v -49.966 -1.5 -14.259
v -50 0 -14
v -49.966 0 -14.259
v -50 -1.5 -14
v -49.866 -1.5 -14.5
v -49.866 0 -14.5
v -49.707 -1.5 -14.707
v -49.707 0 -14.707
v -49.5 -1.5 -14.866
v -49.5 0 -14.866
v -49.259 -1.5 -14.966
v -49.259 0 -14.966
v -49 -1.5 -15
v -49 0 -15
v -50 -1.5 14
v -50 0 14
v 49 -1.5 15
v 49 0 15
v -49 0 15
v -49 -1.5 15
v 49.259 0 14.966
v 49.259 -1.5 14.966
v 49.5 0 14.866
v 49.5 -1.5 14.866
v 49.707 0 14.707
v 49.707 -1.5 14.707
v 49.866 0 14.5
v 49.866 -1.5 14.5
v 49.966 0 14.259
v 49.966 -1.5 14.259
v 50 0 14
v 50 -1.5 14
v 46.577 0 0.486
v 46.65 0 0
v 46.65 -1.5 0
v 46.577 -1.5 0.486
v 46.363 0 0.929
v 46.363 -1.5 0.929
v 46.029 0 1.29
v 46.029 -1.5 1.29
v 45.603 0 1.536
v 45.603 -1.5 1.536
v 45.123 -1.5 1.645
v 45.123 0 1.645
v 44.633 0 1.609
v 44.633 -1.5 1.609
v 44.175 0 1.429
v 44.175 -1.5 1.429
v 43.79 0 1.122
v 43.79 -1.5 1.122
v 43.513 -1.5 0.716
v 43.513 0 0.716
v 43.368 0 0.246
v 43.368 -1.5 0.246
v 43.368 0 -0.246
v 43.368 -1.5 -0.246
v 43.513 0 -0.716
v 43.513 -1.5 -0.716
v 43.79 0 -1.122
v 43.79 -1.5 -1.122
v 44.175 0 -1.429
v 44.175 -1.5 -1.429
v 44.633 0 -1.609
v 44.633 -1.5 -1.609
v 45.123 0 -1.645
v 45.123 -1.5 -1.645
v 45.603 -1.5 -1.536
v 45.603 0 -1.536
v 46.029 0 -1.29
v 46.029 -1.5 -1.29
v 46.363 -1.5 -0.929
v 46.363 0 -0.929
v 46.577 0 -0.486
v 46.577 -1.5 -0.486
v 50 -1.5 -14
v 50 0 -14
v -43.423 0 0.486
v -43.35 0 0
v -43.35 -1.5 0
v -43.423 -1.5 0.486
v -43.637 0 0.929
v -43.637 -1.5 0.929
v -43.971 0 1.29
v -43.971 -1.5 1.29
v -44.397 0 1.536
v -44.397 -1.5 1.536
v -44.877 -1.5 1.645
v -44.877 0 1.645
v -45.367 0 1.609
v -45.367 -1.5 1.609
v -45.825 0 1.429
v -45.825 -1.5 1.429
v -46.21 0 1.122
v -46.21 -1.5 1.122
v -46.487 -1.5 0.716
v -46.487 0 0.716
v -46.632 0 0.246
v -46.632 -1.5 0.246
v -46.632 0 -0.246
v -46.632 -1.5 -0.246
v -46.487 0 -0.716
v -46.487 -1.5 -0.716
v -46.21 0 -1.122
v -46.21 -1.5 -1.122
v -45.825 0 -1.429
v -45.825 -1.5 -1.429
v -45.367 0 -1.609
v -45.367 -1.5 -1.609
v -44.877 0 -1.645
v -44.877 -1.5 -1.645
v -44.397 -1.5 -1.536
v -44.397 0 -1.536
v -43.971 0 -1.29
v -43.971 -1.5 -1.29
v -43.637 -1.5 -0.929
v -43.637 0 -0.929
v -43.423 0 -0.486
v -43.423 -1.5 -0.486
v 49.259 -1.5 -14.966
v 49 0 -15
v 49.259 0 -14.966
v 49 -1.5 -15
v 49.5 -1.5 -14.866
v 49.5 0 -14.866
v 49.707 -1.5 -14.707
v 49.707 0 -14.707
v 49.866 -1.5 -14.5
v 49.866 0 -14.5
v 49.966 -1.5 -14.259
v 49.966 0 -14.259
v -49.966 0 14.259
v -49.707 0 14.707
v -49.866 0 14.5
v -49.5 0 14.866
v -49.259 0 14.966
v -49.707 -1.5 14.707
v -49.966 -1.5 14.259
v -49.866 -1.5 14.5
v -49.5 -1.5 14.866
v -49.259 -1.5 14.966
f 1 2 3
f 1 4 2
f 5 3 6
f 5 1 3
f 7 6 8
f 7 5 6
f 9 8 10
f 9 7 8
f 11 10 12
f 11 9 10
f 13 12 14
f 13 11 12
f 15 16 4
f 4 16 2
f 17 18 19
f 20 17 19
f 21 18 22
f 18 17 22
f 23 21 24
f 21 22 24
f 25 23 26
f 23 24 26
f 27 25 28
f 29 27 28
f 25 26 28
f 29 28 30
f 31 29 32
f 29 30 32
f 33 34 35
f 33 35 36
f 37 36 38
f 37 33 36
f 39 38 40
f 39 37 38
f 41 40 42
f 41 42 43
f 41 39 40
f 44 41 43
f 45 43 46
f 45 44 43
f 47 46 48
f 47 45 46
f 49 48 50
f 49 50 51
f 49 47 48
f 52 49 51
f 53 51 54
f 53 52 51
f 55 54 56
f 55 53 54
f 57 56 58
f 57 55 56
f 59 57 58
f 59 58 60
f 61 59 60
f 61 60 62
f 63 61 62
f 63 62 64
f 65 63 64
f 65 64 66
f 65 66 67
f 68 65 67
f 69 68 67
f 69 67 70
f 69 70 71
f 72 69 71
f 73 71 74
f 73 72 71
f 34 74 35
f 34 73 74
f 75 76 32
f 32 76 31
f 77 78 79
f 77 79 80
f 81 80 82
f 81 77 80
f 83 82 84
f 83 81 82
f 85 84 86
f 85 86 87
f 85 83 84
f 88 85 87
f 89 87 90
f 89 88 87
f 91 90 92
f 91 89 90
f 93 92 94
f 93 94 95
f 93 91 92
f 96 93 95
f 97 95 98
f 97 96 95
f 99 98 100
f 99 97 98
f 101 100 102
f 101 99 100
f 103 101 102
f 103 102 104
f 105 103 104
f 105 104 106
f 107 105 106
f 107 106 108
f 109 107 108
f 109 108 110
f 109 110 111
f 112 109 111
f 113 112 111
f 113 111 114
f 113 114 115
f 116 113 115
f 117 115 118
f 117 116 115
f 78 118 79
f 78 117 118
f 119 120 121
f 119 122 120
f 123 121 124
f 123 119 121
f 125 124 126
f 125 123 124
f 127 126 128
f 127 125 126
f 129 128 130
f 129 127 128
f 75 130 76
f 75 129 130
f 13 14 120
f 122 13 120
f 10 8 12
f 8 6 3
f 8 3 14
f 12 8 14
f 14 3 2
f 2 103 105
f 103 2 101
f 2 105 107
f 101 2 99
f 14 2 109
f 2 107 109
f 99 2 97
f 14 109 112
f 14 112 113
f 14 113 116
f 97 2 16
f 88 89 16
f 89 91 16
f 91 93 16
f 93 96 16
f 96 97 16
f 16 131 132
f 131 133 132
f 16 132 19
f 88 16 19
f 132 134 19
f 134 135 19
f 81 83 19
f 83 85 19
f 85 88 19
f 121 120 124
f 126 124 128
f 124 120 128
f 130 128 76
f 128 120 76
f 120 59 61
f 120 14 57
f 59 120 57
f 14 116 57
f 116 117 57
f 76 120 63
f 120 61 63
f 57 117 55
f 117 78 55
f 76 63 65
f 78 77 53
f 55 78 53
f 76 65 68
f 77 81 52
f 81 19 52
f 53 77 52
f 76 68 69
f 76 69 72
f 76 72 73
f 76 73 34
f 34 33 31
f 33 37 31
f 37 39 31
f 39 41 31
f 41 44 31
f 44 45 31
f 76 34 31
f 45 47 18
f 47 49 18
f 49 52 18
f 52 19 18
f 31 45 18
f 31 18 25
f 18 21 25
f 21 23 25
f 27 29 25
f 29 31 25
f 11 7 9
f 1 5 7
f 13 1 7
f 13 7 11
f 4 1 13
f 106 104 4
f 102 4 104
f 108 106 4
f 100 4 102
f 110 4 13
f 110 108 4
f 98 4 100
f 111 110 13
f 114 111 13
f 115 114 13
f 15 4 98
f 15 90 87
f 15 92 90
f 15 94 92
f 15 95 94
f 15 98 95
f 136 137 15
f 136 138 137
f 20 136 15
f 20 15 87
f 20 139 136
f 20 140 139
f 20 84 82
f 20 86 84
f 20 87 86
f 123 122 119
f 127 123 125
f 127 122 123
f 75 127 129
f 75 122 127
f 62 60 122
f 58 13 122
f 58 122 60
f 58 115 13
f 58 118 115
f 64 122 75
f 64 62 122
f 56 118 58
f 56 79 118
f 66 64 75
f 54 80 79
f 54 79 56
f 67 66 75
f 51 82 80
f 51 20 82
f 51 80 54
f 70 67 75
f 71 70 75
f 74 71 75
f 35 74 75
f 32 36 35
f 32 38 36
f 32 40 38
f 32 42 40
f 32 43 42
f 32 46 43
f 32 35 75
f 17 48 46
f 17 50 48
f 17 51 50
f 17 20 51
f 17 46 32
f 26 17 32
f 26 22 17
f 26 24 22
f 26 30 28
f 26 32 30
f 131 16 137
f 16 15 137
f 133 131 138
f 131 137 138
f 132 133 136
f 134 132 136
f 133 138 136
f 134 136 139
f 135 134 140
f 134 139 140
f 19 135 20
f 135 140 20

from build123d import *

# Parameters (mm, degrees)
F0_R     = 1.65
F1_DEPTH = 1.5
F2_R     = 1


with BuildPart() as f1:
    # F0 (on Front) → F1 (new body)
    with BuildSketch(Plane.XZ):
        Polygon((0, 15), (-50, 15), (-50, -15), (0, -15), (50, -15), (50, 15), align=None)
        with Locations((-45, 0)):
            Circle(F0_R, mode=Mode.SUBTRACT)
        with Locations((45, 0)):
            Circle(F0_R, mode=Mode.SUBTRACT)
    extrude(amount=F1_DEPTH)

    # F2
    f2_edges = [f1.edges().sort_by_distance(p)[0] for p in [
        (50, -0.75, 15),
        (50, -0.75, -15),
        (-50, -0.75, 15),
        (-50, -0.75, -15),
    ]]
    fillet(f2_edges, radius=F2_R)


solid = f1.part
